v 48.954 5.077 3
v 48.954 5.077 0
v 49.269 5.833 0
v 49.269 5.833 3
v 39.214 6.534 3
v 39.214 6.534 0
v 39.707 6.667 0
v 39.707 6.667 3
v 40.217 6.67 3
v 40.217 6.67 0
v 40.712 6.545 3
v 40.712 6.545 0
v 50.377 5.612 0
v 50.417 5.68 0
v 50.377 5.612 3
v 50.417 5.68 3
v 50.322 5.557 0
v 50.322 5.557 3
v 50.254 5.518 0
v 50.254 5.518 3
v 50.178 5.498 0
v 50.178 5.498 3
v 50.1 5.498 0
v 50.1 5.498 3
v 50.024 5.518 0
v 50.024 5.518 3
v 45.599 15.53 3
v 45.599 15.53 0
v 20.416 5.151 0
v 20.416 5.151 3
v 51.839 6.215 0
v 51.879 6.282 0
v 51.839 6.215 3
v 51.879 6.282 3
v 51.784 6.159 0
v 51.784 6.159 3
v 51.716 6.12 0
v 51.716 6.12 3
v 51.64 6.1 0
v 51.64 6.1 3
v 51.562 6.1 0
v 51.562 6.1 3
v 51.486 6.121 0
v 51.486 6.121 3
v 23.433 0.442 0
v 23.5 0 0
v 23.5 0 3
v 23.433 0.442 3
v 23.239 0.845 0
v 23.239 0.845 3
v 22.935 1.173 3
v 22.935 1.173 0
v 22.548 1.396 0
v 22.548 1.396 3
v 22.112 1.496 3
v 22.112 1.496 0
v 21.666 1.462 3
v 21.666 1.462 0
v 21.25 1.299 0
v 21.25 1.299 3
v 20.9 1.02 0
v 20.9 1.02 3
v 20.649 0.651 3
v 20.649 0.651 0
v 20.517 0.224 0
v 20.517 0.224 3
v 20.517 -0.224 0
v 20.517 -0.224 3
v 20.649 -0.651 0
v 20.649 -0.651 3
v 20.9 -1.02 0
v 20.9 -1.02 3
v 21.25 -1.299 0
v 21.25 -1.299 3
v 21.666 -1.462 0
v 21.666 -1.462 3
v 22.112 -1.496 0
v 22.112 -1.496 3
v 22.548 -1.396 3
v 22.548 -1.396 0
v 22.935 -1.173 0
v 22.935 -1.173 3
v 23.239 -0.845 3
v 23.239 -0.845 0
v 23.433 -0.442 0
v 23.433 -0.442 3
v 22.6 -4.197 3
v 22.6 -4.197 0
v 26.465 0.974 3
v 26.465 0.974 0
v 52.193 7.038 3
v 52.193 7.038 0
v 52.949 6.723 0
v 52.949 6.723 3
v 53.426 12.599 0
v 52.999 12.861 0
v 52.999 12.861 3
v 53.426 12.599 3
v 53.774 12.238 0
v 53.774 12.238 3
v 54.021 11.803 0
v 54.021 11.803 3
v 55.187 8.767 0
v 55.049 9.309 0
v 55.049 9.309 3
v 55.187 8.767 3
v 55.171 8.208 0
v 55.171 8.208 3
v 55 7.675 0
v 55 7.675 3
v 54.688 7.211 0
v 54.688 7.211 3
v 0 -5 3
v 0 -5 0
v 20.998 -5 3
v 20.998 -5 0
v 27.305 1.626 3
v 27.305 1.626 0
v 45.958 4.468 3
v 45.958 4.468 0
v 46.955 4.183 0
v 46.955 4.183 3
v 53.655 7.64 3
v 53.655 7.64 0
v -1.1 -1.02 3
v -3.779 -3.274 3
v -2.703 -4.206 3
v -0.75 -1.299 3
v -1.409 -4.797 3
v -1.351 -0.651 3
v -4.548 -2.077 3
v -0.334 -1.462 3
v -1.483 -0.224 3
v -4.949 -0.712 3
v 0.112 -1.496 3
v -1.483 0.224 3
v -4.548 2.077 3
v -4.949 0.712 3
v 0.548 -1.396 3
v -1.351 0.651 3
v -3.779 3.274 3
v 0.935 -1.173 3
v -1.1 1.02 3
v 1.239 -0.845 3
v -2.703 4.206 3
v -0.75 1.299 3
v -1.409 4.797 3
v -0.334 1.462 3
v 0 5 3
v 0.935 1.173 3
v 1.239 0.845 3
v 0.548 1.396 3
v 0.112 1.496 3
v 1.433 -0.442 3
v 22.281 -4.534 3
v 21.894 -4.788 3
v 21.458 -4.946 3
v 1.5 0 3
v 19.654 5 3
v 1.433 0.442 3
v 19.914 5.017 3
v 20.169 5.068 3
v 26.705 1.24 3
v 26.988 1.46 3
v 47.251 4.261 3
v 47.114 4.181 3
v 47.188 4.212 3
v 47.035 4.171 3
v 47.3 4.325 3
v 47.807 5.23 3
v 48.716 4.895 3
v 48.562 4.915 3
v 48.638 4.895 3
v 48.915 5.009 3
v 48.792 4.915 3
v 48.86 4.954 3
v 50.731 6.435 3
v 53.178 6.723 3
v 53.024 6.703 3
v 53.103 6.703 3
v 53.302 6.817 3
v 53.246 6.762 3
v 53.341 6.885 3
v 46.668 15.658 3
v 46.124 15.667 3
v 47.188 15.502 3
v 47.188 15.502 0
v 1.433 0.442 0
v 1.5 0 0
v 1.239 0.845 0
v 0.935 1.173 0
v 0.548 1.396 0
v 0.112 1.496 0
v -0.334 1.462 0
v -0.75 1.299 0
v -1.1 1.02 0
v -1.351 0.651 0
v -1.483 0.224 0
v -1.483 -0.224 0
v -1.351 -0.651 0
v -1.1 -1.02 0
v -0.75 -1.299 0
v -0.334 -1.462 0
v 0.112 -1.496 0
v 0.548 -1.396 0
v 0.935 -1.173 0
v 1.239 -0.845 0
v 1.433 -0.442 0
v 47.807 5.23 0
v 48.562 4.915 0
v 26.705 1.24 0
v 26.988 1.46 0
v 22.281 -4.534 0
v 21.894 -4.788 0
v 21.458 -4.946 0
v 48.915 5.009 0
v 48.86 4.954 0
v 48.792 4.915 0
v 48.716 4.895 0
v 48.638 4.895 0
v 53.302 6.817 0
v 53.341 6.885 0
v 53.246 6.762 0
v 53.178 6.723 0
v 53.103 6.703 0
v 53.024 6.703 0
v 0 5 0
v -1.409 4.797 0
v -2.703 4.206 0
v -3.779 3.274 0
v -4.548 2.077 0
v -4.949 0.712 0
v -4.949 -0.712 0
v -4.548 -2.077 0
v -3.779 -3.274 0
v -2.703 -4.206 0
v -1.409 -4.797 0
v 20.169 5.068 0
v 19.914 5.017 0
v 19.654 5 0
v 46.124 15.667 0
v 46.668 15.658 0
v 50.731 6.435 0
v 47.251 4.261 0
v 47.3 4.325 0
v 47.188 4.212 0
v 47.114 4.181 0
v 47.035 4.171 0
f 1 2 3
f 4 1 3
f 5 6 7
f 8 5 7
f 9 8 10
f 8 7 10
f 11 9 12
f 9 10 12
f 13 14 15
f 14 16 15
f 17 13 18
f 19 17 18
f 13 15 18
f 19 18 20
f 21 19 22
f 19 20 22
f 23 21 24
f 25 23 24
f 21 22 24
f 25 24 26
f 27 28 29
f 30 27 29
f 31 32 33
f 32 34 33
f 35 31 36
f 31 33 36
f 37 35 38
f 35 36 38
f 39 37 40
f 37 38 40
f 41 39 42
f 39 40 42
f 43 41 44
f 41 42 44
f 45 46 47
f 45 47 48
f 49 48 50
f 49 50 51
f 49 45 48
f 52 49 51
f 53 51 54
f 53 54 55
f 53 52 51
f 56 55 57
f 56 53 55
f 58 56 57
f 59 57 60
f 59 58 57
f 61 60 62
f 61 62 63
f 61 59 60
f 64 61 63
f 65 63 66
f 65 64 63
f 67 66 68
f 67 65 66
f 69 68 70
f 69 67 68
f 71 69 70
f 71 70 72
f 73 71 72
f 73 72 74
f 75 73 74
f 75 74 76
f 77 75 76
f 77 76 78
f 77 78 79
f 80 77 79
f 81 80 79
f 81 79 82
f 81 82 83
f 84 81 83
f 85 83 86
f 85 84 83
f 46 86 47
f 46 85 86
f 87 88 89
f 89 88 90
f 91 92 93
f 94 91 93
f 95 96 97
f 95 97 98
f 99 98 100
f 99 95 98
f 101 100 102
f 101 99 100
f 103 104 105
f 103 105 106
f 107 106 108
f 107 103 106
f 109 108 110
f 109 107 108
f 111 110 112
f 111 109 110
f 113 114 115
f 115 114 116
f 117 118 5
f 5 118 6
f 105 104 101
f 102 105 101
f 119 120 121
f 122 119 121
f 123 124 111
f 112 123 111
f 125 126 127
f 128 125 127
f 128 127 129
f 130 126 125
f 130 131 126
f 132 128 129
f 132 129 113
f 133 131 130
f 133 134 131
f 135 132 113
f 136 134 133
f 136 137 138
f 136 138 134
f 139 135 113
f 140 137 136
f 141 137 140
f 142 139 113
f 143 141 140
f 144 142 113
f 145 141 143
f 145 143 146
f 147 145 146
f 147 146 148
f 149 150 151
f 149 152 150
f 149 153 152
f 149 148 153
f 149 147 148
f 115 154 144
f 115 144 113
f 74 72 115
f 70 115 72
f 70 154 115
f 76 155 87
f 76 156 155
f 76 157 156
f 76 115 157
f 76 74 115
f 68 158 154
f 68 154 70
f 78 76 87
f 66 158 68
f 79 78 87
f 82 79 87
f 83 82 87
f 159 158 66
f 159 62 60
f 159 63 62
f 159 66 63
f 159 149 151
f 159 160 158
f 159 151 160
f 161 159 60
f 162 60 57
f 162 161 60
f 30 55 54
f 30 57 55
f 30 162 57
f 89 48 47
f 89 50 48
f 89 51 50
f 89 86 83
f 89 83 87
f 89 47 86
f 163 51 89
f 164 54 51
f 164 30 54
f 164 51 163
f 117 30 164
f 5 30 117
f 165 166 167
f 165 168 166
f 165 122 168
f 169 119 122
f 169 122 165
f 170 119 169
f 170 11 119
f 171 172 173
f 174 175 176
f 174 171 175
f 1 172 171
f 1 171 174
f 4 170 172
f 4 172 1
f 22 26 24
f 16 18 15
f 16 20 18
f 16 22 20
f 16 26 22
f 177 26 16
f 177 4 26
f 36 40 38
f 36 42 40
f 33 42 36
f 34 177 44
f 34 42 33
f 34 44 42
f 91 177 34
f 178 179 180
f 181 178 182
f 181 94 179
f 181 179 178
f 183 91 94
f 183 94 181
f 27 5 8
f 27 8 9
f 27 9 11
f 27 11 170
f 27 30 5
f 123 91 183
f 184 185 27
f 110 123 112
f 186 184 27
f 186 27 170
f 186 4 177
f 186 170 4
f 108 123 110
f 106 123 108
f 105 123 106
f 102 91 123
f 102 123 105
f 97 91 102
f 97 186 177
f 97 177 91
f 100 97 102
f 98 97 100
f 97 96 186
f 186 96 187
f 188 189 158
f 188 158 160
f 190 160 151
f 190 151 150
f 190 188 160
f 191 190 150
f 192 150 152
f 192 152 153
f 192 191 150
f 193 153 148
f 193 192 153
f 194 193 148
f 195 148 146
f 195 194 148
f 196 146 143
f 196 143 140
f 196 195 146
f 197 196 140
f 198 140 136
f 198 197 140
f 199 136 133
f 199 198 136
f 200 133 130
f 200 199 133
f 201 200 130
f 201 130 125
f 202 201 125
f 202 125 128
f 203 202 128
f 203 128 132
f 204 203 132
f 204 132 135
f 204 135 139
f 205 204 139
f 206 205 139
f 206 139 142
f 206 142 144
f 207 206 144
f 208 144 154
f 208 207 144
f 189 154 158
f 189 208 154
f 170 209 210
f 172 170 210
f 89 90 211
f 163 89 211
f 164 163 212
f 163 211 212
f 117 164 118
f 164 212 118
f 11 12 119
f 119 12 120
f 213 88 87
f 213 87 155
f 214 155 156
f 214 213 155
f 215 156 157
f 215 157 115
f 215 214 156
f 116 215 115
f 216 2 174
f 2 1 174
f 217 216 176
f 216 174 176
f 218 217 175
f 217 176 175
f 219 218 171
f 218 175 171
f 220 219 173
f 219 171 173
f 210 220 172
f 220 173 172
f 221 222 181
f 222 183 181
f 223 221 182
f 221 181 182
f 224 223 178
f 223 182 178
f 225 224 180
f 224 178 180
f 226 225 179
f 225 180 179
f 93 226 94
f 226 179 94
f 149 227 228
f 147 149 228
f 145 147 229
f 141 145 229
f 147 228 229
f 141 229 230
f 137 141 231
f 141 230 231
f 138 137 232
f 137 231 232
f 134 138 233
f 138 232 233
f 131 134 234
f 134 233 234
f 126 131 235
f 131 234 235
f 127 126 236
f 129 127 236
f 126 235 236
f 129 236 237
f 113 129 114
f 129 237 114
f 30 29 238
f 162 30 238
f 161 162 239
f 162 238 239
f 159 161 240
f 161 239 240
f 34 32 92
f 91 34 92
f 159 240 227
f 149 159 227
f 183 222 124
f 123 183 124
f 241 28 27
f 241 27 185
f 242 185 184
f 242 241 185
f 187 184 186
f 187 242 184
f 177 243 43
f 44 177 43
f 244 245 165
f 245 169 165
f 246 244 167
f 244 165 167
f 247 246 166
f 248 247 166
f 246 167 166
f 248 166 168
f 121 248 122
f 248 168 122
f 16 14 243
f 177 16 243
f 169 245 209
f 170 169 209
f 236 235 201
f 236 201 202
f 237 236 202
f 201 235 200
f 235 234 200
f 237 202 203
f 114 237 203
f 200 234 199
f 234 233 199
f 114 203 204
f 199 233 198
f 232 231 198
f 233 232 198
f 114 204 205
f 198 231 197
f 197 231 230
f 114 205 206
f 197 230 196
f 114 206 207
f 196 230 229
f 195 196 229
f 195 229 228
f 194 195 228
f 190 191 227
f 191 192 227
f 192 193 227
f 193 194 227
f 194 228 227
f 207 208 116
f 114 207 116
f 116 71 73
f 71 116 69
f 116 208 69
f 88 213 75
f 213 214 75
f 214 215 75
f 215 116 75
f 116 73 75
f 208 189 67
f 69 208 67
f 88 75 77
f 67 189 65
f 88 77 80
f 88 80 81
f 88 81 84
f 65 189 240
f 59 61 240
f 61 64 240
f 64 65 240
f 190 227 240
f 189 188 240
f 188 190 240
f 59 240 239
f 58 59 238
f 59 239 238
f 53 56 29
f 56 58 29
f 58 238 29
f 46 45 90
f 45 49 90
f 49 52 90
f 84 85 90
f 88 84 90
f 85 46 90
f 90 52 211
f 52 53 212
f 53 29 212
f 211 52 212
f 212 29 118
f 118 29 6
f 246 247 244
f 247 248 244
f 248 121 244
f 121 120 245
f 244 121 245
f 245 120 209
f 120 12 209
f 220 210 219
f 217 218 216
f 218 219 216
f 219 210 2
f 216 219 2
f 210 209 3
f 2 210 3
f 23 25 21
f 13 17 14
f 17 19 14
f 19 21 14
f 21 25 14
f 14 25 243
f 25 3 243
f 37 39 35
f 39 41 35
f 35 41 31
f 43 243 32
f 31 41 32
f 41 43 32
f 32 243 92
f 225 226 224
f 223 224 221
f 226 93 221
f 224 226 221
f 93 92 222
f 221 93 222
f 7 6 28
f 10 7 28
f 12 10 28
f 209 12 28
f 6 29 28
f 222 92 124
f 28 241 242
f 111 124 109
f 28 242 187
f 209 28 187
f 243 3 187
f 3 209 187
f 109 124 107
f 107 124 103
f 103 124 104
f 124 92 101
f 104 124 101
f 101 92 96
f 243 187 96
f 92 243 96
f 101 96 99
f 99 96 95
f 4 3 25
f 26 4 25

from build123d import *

# Parameters (mm, degrees)
SKETCH2_R           = 1.5
BOSS_EXTRUDE1_DEPTH = 3
FILLET1_START       = -1
FILLET1_DEPTH       = 5
FILLET1_2_DEPTH     = 3
FILLET2_R           = 0.3


with BuildPart() as part:
    # Sketch2 → Boss-Extrude1 (new body)
    with BuildSketch(Plane.XY):
        with BuildLine():
            Line((20.05, 5), (0, 5))
            ThreePointArc((0, 5), (-5, 0), (0, -5))
            Line((0, -5), (22, -5))
            Line((22, -5), (26.795441544, 1.415535375))
            Line((26.795441544, 1.415535375), (39.960977063, 6.841977535))
            Line((39.960977063, 6.841977535), (45.957673933, 4.467717283))
            Line((45.957673933, 4.467717283), (47.183545432, 4.117717283))
            Line((47.183545432, 4.117717283), (47.806766001, 5.229858036))
            Line((47.806766001, 5.229858036), (48.839161842, 4.800113125))
            Line((48.839161842, 4.800113125), (49.268906753, 5.832508966))
            Line((49.268906753, 5.832508966), (50.301302595, 5.402764054))
            Line((50.301302595, 5.402764054), (50.731047506, 6.435159896))
            Line((50.731047506, 6.435159896), (51.763443347, 6.005414984))
            Line((51.763443347, 6.005414984), (52.193188259, 7.037810826))
            Line((52.193188259, 7.037810826), (53.2255841, 6.608065914))
            Line((53.2255841, 6.608065914), (53.655329011, 7.640461756))
            Line((53.655329011, 7.640461756), (54.687724853, 7.210716844))
            Line((54.687724853, 7.210716844), (55.741112884, 7.640461756))
            Line((55.741112884, 7.640461756), (55.434270778, 8.373688641))
            Line((55.434270778, 8.373688641), (53.719454084, 12.534145792))
            Line((53.719454084, 12.534145792), (46.399561958, 15.860505726))
            Line((46.399561958, 15.860505726), (20.05, 5))
        make_face()
        Circle(SKETCH2_R, mode=Mode.SUBTRACT)
        with Locations((22, 0)):
            Circle(SKETCH2_R, mode=Mode.SUBTRACT)
    extrude(amount=BOSS_EXTRUDE1_DEPTH)

    # Fillet1: read off the stored shape, not the designer's step
    # Fillet1 outline → Fillet1 (cut)
    with BuildSketch(Plane.XY.offset(FILLET1_START)):
        with BuildLine():
            Line((55.434270778, 8.373688641), (55.048718881, 9.309107658))
            ThreePointArc((55.048718881, 9.309107658), (55.170672337, 8.207880564), (54.687724853, 7.210716844))
            Line((54.687724853, 7.210716844), (55.741112884, 7.640461756))
            Line((55.741112884, 7.640461756), (55.434270778, 8.373688641))
        make_face()
        with BuildLine():
            Line((53.719454084, 12.534145792), (52.999247687, 12.861427351))
            ThreePointArc((52.999247687, 12.861427351), (53.610964364, 12.429448634), (54.020911938, 11.802754217))
            Line((54.020911938, 11.802754217), (53.719454084, 12.534145792))
        make_face()
        with BuildLine():
            Line((46.399561958, 15.860505726), (45.598653524, 15.530395091))
            ThreePointArc((45.598653524, 15.530395091), (46.396368341, 15.68098662), (47.188222093, 15.50211691))
            Line((47.188222093, 15.50211691), (46.399561958, 15.860505726))
        make_face()
        with BuildLine():
            Line((22, -5), (22.59991613, -4.197407971))
            ThreePointArc((22.59991613, -4.197407971), (21.893850393, -4.788129741), (20.997975386, -5))
            Line((20.997975386, -5), (22, -5))
        make_face()
    extrude(amount=FILLET1_DEPTH, mode=Mode.SUBTRACT)

    # Fillet1 2 outline → Fillet1 2 (add)
    with BuildSketch(Plane.XY):
        with BuildLine():
            ThreePointArc((20.416130089, 5.150907933), (20.042458039, 5.038089689), (19.653989336, 5))
            Line((19.653989336, 5), (20.05, 5))
            Line((20.05, 5), (20.416130089, 5.150907933))
        make_face()
        with BuildLine():
            ThreePointArc((26.465363358, 0.973943448), (26.841174676, 1.356600864), (27.305163351, 1.625627544))
            Line((27.305163351, 1.625627544), (26.795441544, 1.415535375))
            Line((26.795441544, 1.415535375), (26.465363358, 0.973943448))
        make_face()
        with BuildLine():
            ThreePointArc((39.213895373, 6.534052683), (39.962073605, 6.684911877), (40.712285231, 6.544513587))
            Line((40.712285231, 6.544513587), (39.960977063, 6.841977535))
            Line((39.960977063, 6.841977535), (39.213895373, 6.534052683))
        make_face()
    extrude(amount=FILLET1_2_DEPTH)

    # Fillet2
    fillet2_edges = [part.edges().sort_by_distance(p)[0] for p in [
        (53.2255841, 6.608065914, 1.5),
        (51.763443347, 6.005414984, 1.5),
        (50.301302595, 5.402764054, 1.5),
        (48.839161842, 4.800113125, 1.5),
        (47.183545432, 4.117717283, 1.5),
    ]]
    fillet(fillet2_edges, radius=FILLET2_R)


solid = part.part
